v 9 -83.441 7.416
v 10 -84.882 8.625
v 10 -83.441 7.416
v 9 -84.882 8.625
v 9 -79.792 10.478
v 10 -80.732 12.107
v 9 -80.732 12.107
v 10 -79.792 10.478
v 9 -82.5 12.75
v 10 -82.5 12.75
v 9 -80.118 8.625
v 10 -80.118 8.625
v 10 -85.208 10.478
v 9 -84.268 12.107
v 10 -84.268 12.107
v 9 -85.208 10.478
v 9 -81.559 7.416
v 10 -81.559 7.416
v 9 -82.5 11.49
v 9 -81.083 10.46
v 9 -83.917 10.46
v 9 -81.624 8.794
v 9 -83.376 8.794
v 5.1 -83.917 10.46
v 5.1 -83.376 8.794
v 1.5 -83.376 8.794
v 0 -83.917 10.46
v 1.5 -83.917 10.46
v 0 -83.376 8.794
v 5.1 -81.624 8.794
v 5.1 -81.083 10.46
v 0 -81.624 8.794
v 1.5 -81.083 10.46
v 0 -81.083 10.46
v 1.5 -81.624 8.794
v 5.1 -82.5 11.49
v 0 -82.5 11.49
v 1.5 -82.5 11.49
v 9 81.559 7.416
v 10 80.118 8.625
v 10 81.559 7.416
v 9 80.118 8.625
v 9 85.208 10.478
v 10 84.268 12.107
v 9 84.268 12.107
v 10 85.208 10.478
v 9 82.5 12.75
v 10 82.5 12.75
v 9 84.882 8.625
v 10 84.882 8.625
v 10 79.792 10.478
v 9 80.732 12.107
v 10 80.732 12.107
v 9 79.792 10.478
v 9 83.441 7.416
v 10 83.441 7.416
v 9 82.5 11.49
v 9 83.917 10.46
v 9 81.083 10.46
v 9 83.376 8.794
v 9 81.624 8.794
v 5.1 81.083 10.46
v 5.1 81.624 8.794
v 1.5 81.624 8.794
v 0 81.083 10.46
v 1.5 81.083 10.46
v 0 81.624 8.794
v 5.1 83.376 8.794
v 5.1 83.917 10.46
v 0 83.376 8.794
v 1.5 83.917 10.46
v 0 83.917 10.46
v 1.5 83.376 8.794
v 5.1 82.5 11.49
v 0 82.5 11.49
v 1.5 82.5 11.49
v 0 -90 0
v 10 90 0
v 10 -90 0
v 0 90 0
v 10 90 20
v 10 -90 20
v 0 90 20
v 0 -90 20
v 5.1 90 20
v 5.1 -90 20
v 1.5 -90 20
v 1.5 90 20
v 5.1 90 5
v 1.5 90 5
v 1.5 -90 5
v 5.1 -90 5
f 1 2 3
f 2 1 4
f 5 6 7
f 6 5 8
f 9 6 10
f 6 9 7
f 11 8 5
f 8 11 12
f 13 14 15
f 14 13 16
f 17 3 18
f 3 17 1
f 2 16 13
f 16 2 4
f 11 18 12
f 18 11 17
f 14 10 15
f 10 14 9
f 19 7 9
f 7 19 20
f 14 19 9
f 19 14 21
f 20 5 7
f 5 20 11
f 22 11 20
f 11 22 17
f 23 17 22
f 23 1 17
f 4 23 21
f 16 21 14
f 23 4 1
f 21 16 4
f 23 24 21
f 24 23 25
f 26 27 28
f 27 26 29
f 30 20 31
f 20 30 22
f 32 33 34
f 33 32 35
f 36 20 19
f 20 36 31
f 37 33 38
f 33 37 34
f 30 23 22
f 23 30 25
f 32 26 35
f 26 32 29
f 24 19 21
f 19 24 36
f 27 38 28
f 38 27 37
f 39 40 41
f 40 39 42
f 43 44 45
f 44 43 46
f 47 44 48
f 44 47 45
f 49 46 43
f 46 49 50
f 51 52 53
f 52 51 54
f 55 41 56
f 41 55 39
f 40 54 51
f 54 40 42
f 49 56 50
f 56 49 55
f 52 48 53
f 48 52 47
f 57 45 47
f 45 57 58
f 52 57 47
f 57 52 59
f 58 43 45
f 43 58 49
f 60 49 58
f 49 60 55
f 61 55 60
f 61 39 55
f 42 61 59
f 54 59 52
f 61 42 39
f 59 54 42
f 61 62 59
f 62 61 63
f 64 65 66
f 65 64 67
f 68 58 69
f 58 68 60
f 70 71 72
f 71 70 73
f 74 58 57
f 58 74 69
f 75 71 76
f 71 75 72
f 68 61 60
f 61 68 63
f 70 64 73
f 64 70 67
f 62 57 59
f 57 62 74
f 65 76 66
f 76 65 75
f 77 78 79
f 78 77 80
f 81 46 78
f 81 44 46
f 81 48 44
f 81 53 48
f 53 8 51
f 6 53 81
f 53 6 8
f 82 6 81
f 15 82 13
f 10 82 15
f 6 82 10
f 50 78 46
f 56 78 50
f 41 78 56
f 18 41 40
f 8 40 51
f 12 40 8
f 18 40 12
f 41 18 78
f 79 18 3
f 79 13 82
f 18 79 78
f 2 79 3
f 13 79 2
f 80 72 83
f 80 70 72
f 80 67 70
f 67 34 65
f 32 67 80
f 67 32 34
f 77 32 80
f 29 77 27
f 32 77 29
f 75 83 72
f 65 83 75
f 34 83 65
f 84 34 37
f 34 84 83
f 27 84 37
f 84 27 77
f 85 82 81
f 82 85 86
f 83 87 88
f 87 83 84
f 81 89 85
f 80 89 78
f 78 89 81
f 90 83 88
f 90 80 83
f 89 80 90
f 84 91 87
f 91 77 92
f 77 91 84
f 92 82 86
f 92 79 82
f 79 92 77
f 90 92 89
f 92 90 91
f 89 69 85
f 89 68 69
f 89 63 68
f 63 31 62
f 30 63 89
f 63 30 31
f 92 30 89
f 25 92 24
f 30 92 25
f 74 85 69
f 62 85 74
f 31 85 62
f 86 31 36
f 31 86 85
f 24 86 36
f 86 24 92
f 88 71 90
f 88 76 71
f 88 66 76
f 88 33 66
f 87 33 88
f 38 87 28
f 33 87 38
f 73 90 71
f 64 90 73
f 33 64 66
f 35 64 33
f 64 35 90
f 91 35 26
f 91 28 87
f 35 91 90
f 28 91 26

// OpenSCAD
use <MCAD/nuts_and_bolts.scad>;


module body()
{
difference(){
       translate([0,-90,0]) cube([20,180,10]);
       translate([0,-90,1.5]) cube([15,180,3.6]);
       translate([10,-82.5,9]) rotate([0,180,0]) boltHole(3.2,length=11);
       translate([10, 82.5,9]) rotate([0,180,0]) boltHole(3.2,length=11);
}
}


translate([0,0,20]) rotate([0,90,0]) body();
